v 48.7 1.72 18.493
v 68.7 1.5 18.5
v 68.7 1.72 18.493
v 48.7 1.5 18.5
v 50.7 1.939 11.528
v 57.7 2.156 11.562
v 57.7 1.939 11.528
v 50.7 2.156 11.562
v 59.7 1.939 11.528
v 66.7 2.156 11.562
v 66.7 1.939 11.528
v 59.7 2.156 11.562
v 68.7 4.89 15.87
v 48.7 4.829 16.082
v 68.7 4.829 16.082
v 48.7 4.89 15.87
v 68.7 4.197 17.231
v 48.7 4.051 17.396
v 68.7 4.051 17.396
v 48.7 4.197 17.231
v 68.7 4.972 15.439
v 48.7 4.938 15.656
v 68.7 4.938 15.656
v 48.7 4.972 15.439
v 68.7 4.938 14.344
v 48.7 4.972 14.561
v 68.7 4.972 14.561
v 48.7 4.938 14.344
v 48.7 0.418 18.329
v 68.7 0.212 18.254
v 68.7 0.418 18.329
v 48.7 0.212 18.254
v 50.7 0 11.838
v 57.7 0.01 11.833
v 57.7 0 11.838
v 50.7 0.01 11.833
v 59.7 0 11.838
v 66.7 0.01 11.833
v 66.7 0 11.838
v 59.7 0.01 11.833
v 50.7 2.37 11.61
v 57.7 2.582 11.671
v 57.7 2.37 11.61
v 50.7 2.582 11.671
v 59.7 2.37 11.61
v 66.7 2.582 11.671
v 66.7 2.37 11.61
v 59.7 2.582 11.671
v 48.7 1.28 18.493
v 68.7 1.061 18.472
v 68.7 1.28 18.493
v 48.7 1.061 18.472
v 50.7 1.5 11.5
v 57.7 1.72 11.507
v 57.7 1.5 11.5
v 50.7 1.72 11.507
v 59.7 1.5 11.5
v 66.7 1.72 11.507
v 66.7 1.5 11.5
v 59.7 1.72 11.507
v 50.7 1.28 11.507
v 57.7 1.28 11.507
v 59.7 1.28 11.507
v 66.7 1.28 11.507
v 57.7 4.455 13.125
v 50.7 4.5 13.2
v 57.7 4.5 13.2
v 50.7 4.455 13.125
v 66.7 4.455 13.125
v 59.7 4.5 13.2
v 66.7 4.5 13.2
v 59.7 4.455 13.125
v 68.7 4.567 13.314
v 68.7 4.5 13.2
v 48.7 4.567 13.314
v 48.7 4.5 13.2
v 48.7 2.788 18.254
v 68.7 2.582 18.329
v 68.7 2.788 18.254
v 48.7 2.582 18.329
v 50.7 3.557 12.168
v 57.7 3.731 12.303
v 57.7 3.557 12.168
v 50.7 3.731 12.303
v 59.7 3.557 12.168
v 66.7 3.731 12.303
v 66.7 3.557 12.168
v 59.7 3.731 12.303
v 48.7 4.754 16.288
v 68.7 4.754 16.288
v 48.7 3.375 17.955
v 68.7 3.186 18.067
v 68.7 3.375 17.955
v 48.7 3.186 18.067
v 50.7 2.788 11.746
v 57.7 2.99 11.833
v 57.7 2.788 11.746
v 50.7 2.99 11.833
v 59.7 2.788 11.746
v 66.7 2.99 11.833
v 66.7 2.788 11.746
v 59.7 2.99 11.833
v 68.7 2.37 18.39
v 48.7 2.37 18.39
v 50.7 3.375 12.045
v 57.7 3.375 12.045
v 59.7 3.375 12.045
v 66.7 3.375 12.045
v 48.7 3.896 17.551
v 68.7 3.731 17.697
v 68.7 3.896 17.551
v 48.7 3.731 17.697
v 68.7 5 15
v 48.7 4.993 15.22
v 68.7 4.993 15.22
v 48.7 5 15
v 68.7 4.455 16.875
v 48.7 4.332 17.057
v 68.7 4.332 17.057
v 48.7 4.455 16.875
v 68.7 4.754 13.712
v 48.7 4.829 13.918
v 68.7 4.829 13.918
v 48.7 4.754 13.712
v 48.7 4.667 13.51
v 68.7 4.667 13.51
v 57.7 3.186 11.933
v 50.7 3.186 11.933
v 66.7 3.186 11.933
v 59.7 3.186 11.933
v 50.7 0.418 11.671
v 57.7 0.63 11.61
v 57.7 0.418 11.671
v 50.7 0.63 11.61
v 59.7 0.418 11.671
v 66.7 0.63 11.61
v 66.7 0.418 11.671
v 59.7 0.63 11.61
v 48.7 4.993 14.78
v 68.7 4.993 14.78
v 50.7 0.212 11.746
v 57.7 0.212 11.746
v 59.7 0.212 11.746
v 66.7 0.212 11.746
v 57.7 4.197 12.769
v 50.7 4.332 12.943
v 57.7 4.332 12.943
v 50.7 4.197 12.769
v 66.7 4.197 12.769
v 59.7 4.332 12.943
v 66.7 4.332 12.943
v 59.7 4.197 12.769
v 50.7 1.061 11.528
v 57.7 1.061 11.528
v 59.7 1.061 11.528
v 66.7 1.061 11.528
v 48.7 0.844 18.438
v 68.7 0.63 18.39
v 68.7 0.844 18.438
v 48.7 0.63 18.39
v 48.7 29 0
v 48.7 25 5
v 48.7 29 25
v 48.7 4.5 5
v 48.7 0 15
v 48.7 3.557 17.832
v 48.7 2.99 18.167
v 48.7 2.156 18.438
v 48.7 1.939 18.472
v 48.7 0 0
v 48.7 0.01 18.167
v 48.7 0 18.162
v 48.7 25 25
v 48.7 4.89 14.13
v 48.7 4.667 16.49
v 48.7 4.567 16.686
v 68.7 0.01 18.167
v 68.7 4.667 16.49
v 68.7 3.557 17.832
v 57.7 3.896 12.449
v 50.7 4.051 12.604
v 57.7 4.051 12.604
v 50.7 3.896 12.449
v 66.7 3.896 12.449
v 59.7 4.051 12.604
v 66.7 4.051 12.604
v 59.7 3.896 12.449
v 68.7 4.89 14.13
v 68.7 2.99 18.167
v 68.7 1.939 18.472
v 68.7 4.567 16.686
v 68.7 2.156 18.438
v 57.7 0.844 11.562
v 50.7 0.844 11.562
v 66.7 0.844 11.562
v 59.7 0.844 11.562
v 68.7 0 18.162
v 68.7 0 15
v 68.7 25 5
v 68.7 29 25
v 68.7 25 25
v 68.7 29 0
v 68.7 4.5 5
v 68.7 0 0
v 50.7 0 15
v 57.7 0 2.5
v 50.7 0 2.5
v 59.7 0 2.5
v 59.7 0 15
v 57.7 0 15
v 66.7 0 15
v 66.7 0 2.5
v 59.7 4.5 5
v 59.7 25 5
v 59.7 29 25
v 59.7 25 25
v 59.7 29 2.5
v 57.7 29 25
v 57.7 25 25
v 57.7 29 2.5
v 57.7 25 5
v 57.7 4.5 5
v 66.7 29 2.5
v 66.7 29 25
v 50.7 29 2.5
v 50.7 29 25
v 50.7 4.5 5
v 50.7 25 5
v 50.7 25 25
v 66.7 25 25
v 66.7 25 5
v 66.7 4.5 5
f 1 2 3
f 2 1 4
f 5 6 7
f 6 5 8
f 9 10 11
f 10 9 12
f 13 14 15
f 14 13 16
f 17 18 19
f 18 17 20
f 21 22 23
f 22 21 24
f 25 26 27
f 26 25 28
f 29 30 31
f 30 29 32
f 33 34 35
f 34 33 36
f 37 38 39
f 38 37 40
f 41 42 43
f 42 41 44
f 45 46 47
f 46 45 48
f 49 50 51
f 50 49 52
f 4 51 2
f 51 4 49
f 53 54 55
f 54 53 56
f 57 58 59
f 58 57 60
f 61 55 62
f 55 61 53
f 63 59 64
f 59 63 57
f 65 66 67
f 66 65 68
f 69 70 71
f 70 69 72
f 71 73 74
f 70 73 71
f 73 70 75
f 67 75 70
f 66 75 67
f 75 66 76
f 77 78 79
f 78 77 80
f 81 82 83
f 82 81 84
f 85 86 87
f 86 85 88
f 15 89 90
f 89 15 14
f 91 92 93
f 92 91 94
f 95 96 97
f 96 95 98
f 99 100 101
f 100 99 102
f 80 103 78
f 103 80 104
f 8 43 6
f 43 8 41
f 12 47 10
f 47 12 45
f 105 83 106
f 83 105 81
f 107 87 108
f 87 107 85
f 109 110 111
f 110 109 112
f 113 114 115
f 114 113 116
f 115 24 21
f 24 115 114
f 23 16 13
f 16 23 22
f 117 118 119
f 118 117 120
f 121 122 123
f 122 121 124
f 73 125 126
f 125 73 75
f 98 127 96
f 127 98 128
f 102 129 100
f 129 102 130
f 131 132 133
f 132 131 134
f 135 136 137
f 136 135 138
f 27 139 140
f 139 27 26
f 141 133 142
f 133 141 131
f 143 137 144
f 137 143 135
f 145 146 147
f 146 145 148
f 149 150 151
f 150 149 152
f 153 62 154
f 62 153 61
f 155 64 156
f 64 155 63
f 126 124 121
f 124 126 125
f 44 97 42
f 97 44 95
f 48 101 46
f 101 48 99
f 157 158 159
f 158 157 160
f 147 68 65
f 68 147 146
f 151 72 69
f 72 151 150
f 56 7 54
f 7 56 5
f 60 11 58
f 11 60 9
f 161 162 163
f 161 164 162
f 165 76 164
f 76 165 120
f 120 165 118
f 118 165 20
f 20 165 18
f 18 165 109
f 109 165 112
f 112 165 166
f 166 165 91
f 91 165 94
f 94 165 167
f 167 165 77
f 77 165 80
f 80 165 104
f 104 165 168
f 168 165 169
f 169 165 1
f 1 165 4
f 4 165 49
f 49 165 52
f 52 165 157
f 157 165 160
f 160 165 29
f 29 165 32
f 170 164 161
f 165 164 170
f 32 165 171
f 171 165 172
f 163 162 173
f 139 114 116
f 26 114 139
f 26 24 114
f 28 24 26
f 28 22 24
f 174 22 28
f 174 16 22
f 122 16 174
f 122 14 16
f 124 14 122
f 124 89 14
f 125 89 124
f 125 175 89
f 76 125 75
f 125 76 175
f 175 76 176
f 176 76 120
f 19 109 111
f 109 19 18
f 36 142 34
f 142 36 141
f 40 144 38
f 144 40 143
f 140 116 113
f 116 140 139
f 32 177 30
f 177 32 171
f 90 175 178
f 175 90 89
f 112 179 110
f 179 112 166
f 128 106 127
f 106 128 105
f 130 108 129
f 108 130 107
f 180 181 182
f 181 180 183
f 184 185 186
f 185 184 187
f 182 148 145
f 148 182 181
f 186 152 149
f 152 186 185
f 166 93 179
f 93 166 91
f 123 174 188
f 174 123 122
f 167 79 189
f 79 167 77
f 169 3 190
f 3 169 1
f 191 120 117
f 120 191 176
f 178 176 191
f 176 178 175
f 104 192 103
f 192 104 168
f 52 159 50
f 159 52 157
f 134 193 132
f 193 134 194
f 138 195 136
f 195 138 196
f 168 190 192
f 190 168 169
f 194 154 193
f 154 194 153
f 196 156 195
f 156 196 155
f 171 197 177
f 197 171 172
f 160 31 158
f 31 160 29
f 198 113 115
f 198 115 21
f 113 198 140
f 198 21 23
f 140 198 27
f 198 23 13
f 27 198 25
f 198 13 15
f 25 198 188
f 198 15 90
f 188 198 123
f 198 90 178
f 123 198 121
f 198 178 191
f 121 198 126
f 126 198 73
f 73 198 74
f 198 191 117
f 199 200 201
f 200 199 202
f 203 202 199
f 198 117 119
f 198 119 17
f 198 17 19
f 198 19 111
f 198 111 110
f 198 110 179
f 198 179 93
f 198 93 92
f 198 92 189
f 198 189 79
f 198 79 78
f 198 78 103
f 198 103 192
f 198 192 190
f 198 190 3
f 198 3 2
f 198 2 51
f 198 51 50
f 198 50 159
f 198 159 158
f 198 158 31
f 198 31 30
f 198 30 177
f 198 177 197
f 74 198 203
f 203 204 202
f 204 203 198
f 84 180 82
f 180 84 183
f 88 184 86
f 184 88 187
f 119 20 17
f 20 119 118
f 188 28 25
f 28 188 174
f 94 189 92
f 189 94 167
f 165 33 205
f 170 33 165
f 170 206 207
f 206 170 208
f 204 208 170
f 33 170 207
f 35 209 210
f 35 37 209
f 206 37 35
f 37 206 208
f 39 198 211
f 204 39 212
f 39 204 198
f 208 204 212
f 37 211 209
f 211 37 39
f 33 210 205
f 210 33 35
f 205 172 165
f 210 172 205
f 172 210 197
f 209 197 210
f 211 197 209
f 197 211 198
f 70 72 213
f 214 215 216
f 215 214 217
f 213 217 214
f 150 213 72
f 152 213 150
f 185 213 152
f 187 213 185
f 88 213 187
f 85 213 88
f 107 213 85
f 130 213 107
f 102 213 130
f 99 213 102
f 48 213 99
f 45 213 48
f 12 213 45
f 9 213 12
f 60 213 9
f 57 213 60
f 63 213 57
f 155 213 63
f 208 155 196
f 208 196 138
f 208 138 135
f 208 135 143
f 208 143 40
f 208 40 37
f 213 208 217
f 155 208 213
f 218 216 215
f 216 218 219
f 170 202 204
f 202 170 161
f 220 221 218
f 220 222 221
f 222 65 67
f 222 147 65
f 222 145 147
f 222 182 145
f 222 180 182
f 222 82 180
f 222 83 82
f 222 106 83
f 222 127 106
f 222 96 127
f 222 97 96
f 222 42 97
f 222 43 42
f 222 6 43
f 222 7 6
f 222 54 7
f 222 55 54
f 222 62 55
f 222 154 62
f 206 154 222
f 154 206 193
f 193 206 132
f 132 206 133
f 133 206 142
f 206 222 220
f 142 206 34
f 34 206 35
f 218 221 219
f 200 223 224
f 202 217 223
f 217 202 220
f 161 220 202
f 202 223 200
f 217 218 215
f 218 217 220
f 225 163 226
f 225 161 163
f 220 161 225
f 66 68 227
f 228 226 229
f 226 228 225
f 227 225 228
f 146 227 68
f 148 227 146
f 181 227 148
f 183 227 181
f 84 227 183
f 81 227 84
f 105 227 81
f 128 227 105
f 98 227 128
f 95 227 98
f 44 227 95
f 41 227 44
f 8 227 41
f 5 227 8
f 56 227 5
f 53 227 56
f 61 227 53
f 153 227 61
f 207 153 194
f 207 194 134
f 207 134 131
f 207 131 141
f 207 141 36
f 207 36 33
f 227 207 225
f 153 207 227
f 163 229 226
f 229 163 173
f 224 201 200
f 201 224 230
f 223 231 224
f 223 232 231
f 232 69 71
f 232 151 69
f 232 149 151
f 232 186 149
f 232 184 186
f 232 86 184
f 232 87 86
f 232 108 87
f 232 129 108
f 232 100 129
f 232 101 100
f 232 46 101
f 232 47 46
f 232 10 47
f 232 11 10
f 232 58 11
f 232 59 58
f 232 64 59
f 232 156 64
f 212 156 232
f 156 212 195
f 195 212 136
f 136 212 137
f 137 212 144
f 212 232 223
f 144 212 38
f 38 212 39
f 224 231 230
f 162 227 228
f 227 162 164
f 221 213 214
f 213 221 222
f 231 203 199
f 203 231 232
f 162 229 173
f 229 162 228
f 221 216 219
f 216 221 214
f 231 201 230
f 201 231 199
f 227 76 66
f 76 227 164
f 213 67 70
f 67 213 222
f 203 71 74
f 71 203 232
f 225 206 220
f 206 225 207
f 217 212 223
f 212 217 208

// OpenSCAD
// modified by www.DIY3Dtech.com
// original design https://www.thingiverse.com/thing:426872
//
// The outer width (from left to right without buttons) of the phone or bumper in millimeters
width = 58.7;
// The outer length (from top to bottom without buttons) of the phone or bumper in millimeters
length = 124.1;
// The outer height (from backside to front side) of the phone or bumper in millimeters
height = 7.9;
// The width of the bridges from top to bottom and from left to right in millimeters. Lower values save material, higher values make the mount more stable. 15 millimeter is a good choice.
bridgewidth = 15;
// The radius of the corners of the phone or bumper. The standard Apple bumper for iPhone 5 has a corner radius of 10 millimeter.
cornerradius = 10;
// The distance bwtween the iPhone holder and the maker rai in millimeter. The current value of 15 should for most applications
mountheight = 15;
// The size of the rail where to mount the vib-holder in millimeters.
tubediameter = 20;
// The fininess of the cylinders. 100 is a good start.
$fn = 100;

module connector(stegwidth) {
	// plates
	translate([-stegwidth/2-2.5,-stegwidth/2-4.5,2]) cube([4.5,4,1.5]);
	translate([stegwidth/2-2,-stegwidth/2-4.5,2]) cube([4.5,4,1.5]);
	translate([-stegwidth/2-2.5,stegwidth/2+5.5,2]) cube([4.5,4,1.5]);
	translate([stegwidth/2-2,stegwidth/2+5.5,2]) cube([4.5,4,1.5]);
	// pins
	translate([-stegwidth/2-2.5,-stegwidth/2-4.5,0]) cube([2,4,2]);
	translate([stegwidth/2+0.5,-stegwidth/2-4.5,0]) cube([2,4,2]);
	translate([-stegwidth/2-2.5,stegwidth/2+5.5,0]) cube([2,4,2]);
	translate([stegwidth/2+0.5,stegwidth/2+5.5,0]) cube([2,4,2]);
}

module connectorcutout(stegwidth) {
		translate([-stegwidth/2-0.1,-stegwidth/2-5,1.5]) cube([3.1,5,1.6]);
		translate([stegwidth/2-3,-stegwidth/2-5,1.5]) cube([3.1,5,1.6]);
		translate([-stegwidth/2-0.1,stegwidth/2+5,1.5]) cube([3.1,5,1.6]);
		translate([stegwidth/2-3,stegwidth/2+5,1.5]) cube([3.1,5,1.6]);
		translate([-stegwidth/2-0.1,-stegwidth/2-10.1,-0.1]) cube([3.1,5.2,3.2]);
		translate([stegwidth/2-3,-stegwidth/2-10.1,-0.1]) cube([3.1,5.2,3.2]);
		translate([-stegwidth/2-0.1,stegwidth/2-0.1,-0.1]) cube([3.1,5.2,3.2]);
		translate([stegwidth/2-3,stegwidth/2-0.1,-0.1]) cube([3.1,5.2,3.2]);
}

module case(width, height, depth, radius, stegwidth) {
	difference() {
		// Outer hull
		hull() {
			translate([-width/2+radius, -height/2+radius, 0]) cylinder(r=radius+2, h=depth+4);
			translate([-width/2+radius, +height/2-radius, 0]) cylinder(r=radius+2, h=depth+4);
			translate([+width/2-radius, -height/2+radius, 0]) cylinder(r=radius+2, h=depth+4);
			translate([+width/2-radius, +height/2-radius, 0]) cylinder(r=radius+2, h=depth+4);
		}
		// substract iPhone itself
		hull() {
			translate([-width/2+radius, -height/2+radius, 3]) cylinder(r=radius, h=depth);
			translate([-width/2+radius, +height/2-radius, 3]) cylinder(r=radius, h=depth);
			translate([+width/2-radius, -height/2+radius, 3]) cylinder(r=radius, h=depth);
			translate([+width/2-radius, +height/2-radius, 3]) cylinder(r=radius, h=depth);
		}
		// display
		hull() {
			translate([-width/2+radius+1, -height/2+radius+1, depth+2.9]) cylinder(r=radius, h=1.2);
			translate([-width/2+radius+1, +height/2-radius-1, depth+2.9]) cylinder(r=radius, h=1.2);
			translate([+width/2-radius-1, -height/2+radius+1, depth+2.9]) cylinder(r=radius, h=1.2);
			translate([+width/2-radius-1, +height/2-radius-1, depth+2.9]) cylinder(r=radius, h=1.2);
		}
		// left and right pins
		translate([-width/2,-stegwidth/2-0.1,depth+2.9]) cube([width,stegwidth+0.2,1.2]);
		// upper left corner
		translate([-width/2-2.1, +stegwidth/2, -0.1]) cube([width/2-stegwidth/2+2.1,height/2-2.9,depth+4.2]);
		// upper right corner
		translate([+stegwidth/2, +stegwidth/2, -0.1]) cube([width/2-stegwidth/2+2.1,height/2-2.9,depth+4.2]);
		// lower left cut
		translate([-width/2-2.1, -height/2+radius, -0.1]) cube([width/2-stegwidth/2+2.1,height/2-stegwidth/2-radius,depth+4.2]);
		// lower right cut
		translate([+stegwidth/2, -height/2+radius, -0.1]) cube([width/2-stegwidth/2+2.1,height/2-stegwidth/2-radius,depth+4.2]);
		// lower connectors cut
		translate([-width/2+radius, -height/2-2.1, 3]) cube([width-radius-radius,3.2,depth+4.2]);
		// vertical connector cutouts
		connectorcutout(stegwidth);
		// horizontal connector cutouts
		rotate([0, 0, -90]) connectorcutout(stegwidth);
	}
	// Schnippel zum losmachen
	translate([-stegwidth/2,height/2,depth+3]) cube([stegwidth,2,3]);
}

module holder(height, radius, stegwidth) {
	// upper plate
	translate([-stegwidth/2-2.5,-stegwidth/2-7,0]) cube([stegwidth+5,stegwidth+14,2.5]);
    
    difference(){
        translate([-stegwidth/2-2.5, -radius-3, 15]) 
        rotate([0,90,0]) 
        cylinder(d=7,h=20);
        
        translate([-15,-44.5,0])
        cube([30,30,30]);
    }
    
	// ring
	difference() {
		union() {
			//translate([-stegwidth/2-2.5,0,radius+height]) rotate([0,90,0]) cylinder(r=radius+2,h=stegwidth+5);
			// vertikale Stege
			translate([-1, -stegwidth/2-7, 0]) cube([2,stegwidth+14,25]);
			translate([-stegwidth/2-2.5, -stegwidth/2-7, 0]) cube([2,stegwidth+14, 25]);
		  	translate([stegwidth/2+0.5, -stegwidth/2-7, 0]) cube([2,stegwidth+14,25]);
		}
		//modifed section
        translate([-stegwidth/2-3.5,-radius,5]) rotate([0,0,0]) cube([(radius*2)+2,20.5,stegwidth+7.2]);
        translate([-stegwidth/2-3.5,-radius*2,15]) rotate([0,0,0]) 
        cube([(radius*2)+2, radius*2,stegwidth+7.2]);
        
		// lower ring cut
		//translate([-stegwidth/2-2.6, -radius-2.1, radius+height+4]) cube([stegwidth+5.2,radius*2+4.2,radius+4]);
	}
	// connector
//	translate([0,-2.5,0]) rotate([0, 180, 0]) connector(stegwidth);
}

//case(width, length, height, cornerradius, bridgewidth);

//rotate([90,0,0]) 
translate([width, tubediameter/2+2 > 14.5 ? tubediameter/2+2 : 14.5, 0]) 
holder(mountheight, tubediameter/2, bridgewidth);
//rotate([180,0,90]) translate([0, 2, 0]) holder(mountheight, tubediameter/2, bridgewidth);
//rotate([90,0,0]) translate([width, 14.5, 0]) holder(mountheight, tubediameter/2, bridgewidth);
